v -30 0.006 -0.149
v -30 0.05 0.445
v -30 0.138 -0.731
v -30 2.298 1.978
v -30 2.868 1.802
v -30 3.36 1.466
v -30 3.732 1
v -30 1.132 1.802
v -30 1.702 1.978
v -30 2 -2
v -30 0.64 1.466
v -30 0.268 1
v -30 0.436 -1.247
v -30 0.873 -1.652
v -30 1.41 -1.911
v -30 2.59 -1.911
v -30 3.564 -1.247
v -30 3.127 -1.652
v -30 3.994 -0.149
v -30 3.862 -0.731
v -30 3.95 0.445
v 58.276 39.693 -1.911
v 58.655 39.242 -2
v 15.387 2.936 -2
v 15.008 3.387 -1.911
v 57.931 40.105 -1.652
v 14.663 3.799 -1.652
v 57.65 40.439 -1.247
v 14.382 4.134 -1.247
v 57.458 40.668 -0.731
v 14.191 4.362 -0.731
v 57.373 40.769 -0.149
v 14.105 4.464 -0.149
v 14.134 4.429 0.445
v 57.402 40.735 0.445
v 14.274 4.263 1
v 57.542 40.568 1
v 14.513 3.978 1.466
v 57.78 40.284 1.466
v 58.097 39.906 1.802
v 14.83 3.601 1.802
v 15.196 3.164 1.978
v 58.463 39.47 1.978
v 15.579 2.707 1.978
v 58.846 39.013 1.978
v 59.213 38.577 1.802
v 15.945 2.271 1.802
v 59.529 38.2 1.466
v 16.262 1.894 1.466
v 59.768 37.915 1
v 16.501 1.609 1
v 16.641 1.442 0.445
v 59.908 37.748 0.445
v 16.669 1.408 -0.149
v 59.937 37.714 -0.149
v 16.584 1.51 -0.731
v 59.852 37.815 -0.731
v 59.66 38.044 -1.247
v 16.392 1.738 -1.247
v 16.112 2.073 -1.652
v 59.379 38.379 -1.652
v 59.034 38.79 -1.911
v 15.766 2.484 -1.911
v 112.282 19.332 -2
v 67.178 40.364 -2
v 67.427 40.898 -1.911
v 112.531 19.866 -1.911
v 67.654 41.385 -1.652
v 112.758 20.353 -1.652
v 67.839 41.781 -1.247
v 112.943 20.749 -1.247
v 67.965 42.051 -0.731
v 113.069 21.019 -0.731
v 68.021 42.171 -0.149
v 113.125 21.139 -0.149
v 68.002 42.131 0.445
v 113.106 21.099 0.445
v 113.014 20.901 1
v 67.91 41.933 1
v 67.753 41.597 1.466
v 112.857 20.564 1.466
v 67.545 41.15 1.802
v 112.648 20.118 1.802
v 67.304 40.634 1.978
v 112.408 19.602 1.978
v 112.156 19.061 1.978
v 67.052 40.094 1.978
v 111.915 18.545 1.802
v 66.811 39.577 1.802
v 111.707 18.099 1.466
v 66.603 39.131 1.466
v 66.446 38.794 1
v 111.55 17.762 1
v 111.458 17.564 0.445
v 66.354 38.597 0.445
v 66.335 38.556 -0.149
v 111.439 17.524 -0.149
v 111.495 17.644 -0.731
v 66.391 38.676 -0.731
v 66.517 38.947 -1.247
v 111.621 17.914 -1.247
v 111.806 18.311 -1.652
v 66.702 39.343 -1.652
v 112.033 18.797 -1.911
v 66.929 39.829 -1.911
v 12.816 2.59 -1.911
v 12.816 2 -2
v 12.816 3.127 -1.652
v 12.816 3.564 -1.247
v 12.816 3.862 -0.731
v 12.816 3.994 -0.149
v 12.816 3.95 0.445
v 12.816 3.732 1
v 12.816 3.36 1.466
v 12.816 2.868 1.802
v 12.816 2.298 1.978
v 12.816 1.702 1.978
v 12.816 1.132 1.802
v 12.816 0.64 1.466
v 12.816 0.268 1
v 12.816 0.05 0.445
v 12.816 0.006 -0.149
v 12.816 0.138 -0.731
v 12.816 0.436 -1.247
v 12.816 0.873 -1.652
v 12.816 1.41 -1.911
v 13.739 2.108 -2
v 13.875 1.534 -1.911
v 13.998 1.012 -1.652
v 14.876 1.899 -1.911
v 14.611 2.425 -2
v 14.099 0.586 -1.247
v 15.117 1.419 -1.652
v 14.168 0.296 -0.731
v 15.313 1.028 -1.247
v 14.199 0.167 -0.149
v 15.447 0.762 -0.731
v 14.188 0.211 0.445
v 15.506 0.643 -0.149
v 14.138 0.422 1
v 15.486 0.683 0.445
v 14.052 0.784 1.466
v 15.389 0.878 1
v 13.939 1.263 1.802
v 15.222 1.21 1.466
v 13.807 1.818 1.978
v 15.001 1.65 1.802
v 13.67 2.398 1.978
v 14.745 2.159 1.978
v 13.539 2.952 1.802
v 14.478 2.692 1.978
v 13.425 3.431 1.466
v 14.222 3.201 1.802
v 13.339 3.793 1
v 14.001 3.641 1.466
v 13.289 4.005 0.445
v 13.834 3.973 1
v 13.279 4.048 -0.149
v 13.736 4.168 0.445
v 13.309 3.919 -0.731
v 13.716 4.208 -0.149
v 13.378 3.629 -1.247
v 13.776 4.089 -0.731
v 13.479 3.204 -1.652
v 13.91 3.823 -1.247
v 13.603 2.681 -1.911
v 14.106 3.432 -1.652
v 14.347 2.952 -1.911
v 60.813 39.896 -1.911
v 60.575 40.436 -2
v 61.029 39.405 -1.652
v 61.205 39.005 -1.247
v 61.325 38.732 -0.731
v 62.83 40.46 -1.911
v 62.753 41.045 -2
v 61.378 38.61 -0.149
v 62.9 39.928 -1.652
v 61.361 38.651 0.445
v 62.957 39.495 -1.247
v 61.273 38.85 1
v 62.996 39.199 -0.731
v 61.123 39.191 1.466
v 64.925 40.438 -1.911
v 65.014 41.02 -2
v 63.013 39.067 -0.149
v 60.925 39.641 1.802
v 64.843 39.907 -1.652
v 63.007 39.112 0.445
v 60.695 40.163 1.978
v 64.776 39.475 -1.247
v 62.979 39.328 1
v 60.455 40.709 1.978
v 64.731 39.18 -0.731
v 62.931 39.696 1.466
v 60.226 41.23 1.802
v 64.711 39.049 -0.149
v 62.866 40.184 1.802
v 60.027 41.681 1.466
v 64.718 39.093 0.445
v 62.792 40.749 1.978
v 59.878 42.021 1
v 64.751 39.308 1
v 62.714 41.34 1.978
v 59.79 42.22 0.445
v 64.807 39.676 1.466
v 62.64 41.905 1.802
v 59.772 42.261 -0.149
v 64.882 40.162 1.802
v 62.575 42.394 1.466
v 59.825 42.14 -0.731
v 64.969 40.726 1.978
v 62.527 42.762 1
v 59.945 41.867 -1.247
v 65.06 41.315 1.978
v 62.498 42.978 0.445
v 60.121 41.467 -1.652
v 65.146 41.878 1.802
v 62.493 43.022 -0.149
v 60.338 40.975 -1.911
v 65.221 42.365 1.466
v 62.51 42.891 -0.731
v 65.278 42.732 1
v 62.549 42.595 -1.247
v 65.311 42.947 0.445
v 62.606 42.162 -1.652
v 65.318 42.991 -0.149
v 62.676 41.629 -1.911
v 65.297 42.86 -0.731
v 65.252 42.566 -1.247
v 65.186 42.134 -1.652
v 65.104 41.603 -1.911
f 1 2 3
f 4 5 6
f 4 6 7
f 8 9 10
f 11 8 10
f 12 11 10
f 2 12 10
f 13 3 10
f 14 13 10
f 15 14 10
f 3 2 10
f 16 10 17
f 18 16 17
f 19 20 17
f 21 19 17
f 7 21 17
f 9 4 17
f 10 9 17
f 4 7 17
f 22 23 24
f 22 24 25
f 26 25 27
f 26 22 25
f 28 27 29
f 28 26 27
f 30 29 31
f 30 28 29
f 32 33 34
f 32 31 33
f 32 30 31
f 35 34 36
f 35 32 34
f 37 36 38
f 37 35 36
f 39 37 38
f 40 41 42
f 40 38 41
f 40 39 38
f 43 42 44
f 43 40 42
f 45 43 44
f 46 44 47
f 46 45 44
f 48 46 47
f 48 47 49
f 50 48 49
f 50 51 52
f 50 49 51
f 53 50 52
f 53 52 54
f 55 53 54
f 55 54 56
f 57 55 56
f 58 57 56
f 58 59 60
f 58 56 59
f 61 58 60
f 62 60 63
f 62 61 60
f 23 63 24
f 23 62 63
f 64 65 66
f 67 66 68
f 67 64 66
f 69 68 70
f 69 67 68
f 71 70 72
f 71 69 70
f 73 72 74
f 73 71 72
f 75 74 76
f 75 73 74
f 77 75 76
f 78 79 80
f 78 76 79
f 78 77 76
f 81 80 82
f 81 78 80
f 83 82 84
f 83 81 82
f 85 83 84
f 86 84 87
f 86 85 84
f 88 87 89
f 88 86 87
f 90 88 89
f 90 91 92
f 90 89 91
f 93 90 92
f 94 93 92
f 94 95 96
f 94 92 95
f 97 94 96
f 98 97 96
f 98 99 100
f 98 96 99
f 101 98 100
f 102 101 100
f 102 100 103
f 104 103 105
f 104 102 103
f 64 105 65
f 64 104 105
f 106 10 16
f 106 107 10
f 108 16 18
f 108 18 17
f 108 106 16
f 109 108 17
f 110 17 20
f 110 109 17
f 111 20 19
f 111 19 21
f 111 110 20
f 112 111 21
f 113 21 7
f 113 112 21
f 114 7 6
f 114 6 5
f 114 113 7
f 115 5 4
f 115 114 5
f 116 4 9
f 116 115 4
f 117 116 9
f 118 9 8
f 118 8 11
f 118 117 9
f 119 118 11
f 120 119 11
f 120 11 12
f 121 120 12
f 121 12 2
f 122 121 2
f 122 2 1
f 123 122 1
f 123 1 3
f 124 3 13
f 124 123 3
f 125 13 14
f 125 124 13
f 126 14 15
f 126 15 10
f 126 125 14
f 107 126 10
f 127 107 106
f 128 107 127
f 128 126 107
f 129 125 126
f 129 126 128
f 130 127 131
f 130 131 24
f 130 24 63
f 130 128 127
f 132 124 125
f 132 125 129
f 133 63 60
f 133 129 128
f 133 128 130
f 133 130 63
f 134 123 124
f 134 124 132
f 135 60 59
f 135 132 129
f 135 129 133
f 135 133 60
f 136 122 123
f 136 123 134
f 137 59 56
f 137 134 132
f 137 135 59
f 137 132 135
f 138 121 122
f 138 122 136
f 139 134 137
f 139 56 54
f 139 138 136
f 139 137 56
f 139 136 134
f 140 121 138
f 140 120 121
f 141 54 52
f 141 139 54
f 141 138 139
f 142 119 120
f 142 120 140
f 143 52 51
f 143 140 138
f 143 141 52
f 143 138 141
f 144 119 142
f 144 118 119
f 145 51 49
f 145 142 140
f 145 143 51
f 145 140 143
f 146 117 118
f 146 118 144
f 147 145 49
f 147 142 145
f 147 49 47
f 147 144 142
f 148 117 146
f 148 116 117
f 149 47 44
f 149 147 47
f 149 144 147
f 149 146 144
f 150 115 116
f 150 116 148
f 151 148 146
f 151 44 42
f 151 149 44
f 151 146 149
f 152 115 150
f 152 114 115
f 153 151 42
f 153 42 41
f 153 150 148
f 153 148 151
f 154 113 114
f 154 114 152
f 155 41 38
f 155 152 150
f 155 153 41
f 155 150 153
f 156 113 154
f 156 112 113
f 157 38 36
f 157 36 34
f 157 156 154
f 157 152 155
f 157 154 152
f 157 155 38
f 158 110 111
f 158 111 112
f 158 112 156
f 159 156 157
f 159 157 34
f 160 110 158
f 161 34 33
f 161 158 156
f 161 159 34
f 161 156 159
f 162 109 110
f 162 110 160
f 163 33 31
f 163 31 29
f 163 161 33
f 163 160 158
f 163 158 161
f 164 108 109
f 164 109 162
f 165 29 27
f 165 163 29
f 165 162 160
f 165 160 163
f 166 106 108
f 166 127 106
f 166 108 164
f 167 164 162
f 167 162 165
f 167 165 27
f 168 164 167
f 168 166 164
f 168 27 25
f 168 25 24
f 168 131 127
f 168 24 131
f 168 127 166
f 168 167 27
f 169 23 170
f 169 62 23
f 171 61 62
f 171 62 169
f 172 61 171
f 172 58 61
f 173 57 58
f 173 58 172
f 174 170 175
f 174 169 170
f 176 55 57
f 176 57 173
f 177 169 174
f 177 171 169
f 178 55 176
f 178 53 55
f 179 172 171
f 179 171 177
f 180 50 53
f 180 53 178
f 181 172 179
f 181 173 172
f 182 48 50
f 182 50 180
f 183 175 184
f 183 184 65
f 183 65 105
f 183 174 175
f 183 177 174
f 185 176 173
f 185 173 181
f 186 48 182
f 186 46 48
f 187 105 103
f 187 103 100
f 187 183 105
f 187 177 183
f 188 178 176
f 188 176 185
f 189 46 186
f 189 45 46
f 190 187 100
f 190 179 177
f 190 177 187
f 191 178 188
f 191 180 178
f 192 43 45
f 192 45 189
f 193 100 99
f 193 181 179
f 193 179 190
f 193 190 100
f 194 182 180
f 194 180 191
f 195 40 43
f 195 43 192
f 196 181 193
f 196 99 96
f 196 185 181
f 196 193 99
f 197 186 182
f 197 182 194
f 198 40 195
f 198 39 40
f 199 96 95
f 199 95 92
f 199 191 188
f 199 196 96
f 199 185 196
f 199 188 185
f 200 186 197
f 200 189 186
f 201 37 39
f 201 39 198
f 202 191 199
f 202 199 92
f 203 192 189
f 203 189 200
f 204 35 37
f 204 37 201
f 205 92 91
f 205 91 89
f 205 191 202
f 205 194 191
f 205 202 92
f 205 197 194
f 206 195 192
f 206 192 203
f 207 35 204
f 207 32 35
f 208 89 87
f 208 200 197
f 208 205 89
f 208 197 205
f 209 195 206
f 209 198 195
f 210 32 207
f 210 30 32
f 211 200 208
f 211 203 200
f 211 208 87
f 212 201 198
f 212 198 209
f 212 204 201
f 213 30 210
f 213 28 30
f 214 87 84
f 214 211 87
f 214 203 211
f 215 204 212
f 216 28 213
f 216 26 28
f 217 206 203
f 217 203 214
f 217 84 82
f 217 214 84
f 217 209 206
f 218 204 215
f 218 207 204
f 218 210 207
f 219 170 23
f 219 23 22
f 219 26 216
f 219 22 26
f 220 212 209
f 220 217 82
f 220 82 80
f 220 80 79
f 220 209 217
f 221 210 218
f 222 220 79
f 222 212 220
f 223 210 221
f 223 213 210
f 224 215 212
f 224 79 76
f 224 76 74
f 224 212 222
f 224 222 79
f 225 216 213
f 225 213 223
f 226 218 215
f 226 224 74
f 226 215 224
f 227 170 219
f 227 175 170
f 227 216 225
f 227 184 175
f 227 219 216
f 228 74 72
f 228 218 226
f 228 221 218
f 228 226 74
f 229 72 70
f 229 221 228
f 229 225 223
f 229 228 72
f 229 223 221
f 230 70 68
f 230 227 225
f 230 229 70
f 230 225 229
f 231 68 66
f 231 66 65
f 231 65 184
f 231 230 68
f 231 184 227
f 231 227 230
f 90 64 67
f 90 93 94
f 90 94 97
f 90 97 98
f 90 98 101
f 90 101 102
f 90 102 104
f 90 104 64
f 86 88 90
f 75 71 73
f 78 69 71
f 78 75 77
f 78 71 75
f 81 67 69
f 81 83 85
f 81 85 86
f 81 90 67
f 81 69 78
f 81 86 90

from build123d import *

# Parameters (mm, degrees)
ESQUISSE2_R        = 2
ESQUISSE2_2_R      = 2
BOSS_EXTRU_1_DEPTH = 30


with BuildPart() as part:
    # Balayage1: sweep along a path in Esquisse1
    with BuildLine(Plane.XY) as balayage1_path:
        Line((0, 0), (12.816178594, 0))
        ThreePointArc((12.816178594, 0), (14.868299454, 0.361844275), (16.672904253, 1.403733341))
        Line((16.672904253, 1.403733341), (59.940468109, 37.709530215))
        ThreePointArc((59.940468109, 37.709530215), (63.014036614, 39.061932725), (66.332903338, 38.551110279))
        Line((66.332903338, 38.551110279), (111.436464109, 17.518974481))
    # Esquisse2 → Balayage1 (sweep)
    with BuildSketch(Plane(origin=(0, 0, 0), x_dir=(0, 0, -1), z_dir=(1, 0, 0))):
        with Locations((0, 2)):
            Circle(ESQUISSE2_R)
    sweep(path=balayage1_path.line)

    # Esquisse2<2> → Boss.-Extru.1 (add)
    with BuildSketch(Plane(origin=(0, 0, 0), x_dir=(0, 0, -1), z_dir=(1, 0, 0))):
        with Locations((0, 2)):
            Circle(ESQUISSE2_2_R)
    extrude(amount=-BOSS_EXTRU_1_DEPTH)


solid = part.part
